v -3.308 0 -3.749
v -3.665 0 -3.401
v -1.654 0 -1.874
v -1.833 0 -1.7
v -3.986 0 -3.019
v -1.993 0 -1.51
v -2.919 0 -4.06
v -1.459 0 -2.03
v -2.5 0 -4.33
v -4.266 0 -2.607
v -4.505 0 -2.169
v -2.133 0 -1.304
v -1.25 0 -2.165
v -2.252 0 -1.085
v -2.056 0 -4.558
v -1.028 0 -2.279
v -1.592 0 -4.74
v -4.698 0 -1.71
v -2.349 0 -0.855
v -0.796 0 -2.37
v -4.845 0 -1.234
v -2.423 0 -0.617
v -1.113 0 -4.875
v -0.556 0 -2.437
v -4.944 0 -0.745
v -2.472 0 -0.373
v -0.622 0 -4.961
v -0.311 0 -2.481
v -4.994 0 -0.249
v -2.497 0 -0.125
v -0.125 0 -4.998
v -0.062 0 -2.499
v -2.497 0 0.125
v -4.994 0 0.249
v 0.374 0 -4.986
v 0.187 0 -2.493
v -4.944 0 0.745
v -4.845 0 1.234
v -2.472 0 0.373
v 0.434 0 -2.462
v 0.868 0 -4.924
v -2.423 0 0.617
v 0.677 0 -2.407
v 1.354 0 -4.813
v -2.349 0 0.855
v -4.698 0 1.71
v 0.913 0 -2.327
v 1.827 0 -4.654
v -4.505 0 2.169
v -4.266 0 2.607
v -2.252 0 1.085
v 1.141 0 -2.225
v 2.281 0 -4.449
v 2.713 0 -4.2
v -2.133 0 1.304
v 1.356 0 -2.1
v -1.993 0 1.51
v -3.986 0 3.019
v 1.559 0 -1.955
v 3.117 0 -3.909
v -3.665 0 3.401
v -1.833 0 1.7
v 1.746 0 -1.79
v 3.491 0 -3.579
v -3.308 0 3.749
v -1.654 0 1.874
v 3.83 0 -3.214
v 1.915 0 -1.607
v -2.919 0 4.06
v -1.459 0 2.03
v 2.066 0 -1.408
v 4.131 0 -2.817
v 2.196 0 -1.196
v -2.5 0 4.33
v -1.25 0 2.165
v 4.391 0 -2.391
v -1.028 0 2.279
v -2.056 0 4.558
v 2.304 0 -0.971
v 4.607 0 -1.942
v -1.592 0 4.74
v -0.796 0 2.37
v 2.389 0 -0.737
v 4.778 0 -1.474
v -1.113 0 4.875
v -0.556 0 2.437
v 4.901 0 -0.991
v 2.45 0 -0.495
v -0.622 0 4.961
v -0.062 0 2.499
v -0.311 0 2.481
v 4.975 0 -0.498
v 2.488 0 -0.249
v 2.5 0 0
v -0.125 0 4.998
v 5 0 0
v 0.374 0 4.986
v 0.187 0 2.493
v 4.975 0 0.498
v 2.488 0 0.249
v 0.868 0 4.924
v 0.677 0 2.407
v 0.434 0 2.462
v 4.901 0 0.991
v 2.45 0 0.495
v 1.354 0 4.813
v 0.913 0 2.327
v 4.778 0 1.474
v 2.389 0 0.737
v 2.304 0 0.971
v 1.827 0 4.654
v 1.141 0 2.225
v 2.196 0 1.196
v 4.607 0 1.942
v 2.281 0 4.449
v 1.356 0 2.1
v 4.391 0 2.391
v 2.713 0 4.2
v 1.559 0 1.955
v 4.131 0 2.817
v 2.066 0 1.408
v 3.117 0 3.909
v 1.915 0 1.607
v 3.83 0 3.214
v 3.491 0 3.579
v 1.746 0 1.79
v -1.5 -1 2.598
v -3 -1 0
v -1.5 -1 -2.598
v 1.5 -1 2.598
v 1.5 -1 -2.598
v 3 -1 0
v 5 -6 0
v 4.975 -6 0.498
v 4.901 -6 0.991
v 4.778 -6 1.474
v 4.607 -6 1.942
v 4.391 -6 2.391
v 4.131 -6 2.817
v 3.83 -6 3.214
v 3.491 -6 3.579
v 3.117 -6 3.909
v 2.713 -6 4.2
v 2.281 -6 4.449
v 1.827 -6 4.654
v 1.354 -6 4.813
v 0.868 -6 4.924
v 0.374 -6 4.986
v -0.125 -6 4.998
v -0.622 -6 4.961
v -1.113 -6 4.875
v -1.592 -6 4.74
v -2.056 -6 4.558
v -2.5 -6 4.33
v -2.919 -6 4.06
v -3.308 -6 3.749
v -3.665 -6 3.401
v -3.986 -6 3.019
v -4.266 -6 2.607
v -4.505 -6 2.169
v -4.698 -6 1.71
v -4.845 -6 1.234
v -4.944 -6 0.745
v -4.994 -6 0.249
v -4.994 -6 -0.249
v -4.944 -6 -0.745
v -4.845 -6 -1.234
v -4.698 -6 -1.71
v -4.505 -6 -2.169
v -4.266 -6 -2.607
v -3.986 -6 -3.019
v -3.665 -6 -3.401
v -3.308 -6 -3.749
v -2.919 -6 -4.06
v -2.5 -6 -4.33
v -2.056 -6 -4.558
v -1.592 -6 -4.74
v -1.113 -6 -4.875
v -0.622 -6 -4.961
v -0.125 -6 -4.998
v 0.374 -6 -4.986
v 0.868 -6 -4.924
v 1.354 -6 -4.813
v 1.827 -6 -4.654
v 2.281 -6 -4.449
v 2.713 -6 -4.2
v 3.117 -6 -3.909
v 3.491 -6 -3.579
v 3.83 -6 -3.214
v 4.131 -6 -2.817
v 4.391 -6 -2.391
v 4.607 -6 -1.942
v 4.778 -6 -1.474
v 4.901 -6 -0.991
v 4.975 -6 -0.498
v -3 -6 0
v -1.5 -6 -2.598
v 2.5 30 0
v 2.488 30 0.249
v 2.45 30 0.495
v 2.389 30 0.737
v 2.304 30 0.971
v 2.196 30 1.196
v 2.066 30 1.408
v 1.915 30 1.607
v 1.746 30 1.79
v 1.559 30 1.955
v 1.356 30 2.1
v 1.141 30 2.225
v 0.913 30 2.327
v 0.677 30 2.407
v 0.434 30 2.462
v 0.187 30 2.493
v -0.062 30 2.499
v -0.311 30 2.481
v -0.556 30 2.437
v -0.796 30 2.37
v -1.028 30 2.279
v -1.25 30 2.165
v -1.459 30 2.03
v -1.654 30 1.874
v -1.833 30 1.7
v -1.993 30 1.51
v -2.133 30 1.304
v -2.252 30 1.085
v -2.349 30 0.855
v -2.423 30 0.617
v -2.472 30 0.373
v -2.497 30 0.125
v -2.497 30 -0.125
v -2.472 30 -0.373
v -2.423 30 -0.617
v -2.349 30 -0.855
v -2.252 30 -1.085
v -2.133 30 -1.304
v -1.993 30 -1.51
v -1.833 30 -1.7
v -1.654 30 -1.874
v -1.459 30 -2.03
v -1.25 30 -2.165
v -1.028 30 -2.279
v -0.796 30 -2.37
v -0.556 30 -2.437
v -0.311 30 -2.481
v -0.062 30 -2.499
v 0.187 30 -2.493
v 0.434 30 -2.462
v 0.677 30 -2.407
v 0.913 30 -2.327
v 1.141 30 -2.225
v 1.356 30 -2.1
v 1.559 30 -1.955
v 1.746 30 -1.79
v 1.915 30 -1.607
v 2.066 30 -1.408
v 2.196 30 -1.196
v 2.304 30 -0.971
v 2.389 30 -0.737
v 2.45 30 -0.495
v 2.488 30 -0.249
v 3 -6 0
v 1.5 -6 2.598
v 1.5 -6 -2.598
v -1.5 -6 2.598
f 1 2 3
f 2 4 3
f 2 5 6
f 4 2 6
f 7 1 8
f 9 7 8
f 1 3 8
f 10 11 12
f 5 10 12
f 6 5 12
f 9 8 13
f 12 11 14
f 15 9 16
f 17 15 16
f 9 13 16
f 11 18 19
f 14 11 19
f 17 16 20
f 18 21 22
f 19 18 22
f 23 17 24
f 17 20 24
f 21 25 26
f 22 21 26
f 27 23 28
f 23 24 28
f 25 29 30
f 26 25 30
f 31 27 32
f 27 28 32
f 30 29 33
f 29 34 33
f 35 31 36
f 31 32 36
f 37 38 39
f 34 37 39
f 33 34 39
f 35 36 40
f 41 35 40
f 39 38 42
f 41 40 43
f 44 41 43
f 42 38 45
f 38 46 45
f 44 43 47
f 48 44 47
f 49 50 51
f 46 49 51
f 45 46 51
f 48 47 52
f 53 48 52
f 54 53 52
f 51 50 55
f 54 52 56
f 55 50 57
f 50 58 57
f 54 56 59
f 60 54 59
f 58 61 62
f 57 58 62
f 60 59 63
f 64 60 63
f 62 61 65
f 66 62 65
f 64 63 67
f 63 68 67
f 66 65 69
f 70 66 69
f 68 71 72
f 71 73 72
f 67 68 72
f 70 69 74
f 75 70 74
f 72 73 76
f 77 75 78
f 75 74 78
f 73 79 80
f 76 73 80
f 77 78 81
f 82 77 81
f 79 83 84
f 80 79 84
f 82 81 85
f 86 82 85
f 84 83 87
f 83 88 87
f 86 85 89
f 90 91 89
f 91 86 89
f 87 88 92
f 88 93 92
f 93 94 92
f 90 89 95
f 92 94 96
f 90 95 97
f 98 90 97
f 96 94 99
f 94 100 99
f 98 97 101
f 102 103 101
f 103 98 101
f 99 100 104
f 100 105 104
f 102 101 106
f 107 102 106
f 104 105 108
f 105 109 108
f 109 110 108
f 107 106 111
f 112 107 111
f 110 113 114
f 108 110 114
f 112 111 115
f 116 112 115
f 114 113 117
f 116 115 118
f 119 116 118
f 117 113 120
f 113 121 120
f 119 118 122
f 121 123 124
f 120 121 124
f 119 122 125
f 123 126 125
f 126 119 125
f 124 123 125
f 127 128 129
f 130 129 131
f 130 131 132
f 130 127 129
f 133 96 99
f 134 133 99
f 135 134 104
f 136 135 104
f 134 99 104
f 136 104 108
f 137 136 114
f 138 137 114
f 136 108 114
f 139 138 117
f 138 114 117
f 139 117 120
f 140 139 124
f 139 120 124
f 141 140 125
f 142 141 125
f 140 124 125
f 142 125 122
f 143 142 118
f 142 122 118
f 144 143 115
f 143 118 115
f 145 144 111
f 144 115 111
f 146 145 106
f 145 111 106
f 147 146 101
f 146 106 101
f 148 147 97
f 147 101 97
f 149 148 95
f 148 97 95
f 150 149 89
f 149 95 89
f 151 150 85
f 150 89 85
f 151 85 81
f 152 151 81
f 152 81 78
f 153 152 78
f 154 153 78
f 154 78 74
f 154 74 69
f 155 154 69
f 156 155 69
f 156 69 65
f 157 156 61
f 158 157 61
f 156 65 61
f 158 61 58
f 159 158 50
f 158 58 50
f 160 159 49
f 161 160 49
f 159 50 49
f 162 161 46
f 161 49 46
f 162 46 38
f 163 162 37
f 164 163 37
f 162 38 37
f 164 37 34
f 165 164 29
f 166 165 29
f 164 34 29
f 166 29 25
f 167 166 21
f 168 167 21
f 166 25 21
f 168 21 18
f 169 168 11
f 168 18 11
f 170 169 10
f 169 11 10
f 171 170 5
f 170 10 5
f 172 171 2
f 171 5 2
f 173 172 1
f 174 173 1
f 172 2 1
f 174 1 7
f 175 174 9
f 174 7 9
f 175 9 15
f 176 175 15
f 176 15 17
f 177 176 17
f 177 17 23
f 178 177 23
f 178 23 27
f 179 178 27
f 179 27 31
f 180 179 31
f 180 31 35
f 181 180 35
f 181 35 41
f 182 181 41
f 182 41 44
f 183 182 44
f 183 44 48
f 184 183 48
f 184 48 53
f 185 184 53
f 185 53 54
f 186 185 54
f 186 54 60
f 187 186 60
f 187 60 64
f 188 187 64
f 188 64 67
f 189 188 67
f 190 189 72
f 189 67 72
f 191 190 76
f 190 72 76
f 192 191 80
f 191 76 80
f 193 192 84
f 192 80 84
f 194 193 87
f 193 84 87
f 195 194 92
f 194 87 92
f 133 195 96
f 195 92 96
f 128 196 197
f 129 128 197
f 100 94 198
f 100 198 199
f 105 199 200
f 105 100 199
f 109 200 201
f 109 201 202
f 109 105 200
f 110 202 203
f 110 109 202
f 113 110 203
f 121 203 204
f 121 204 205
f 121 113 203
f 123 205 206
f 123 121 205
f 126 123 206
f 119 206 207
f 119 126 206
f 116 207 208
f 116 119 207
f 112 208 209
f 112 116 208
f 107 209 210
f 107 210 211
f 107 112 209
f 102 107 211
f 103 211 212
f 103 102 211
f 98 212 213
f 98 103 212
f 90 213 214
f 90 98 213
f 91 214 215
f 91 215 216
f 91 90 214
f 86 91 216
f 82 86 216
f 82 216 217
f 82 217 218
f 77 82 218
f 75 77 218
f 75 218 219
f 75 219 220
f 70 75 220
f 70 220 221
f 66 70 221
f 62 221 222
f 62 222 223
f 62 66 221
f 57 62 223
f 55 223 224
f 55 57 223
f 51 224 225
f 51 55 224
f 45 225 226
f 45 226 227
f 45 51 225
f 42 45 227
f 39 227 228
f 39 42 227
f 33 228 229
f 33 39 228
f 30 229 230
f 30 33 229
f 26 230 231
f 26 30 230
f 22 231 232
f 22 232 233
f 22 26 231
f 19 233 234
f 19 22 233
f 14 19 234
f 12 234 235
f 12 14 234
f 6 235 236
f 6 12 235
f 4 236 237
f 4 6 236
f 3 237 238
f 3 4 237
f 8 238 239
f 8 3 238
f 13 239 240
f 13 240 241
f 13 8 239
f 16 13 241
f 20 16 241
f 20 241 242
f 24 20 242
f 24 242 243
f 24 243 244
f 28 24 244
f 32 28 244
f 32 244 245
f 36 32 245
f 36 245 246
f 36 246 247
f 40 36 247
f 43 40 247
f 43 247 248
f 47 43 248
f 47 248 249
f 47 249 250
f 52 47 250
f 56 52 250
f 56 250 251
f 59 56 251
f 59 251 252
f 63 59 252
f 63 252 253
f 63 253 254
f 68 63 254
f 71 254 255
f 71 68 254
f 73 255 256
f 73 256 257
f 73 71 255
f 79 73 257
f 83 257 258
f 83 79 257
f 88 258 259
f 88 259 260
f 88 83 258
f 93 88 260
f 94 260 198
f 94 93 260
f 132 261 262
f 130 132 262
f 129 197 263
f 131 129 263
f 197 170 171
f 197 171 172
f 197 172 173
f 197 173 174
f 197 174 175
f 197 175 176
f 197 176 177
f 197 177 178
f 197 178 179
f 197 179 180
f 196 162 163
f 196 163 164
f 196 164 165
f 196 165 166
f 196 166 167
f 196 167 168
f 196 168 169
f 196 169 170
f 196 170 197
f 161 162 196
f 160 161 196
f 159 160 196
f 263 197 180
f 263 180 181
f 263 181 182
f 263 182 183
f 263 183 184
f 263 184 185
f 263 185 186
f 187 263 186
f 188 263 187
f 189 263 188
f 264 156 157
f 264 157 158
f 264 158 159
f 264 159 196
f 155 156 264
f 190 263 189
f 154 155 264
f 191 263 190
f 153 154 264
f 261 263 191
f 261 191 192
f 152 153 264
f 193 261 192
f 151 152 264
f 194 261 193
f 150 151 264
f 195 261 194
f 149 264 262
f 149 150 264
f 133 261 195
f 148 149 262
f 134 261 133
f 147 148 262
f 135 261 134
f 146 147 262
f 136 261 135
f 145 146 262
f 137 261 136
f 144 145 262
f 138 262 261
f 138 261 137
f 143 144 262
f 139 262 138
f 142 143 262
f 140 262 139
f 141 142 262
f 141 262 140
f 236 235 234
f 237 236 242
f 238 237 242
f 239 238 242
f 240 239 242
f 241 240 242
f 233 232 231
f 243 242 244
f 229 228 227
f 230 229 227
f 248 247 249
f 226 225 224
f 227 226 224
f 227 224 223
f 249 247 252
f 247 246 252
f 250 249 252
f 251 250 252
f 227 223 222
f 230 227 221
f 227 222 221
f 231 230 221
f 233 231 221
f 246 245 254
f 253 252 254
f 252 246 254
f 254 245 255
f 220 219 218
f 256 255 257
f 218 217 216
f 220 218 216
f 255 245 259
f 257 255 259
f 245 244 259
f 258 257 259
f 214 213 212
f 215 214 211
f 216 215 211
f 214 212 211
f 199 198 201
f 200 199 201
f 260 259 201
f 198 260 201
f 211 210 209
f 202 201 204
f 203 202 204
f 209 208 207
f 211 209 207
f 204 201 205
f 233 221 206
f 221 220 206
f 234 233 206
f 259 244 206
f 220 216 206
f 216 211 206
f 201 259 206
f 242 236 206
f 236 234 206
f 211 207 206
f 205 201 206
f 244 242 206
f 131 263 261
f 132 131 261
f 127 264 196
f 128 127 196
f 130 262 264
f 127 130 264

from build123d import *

# Parameters (mm, degrees)
F0_R     = 2.5
F1_DEPTH = 30
F3_R     = 5
F4_DEPTH = 6
F7_DEPTH = 5


with BuildPart() as f1:
    # F0 (on Front) → F1 (new body)
    with BuildSketch(Plane.XZ):
        Circle(F0_R)
    extrude(amount=-F1_DEPTH)

    # F3 (on offset) → F4 (join)
    with BuildSketch(Plane.XZ):
        Circle(F3_R)
    extrude(amount=F4_DEPTH)

    # F6 (on offset) → F7 (cut)
    with BuildSketch(Plane.XZ.offset(6)):
        Polygon((1.5, 2.598076), (-1.5, 2.598076), (-3, 0), (-1.5, -2.598076), (1.5, -2.598076), (3, 0), align=None)
    extrude(amount=-F7_DEPTH, mode=Mode.SUBTRACT)


solid = f1.part
